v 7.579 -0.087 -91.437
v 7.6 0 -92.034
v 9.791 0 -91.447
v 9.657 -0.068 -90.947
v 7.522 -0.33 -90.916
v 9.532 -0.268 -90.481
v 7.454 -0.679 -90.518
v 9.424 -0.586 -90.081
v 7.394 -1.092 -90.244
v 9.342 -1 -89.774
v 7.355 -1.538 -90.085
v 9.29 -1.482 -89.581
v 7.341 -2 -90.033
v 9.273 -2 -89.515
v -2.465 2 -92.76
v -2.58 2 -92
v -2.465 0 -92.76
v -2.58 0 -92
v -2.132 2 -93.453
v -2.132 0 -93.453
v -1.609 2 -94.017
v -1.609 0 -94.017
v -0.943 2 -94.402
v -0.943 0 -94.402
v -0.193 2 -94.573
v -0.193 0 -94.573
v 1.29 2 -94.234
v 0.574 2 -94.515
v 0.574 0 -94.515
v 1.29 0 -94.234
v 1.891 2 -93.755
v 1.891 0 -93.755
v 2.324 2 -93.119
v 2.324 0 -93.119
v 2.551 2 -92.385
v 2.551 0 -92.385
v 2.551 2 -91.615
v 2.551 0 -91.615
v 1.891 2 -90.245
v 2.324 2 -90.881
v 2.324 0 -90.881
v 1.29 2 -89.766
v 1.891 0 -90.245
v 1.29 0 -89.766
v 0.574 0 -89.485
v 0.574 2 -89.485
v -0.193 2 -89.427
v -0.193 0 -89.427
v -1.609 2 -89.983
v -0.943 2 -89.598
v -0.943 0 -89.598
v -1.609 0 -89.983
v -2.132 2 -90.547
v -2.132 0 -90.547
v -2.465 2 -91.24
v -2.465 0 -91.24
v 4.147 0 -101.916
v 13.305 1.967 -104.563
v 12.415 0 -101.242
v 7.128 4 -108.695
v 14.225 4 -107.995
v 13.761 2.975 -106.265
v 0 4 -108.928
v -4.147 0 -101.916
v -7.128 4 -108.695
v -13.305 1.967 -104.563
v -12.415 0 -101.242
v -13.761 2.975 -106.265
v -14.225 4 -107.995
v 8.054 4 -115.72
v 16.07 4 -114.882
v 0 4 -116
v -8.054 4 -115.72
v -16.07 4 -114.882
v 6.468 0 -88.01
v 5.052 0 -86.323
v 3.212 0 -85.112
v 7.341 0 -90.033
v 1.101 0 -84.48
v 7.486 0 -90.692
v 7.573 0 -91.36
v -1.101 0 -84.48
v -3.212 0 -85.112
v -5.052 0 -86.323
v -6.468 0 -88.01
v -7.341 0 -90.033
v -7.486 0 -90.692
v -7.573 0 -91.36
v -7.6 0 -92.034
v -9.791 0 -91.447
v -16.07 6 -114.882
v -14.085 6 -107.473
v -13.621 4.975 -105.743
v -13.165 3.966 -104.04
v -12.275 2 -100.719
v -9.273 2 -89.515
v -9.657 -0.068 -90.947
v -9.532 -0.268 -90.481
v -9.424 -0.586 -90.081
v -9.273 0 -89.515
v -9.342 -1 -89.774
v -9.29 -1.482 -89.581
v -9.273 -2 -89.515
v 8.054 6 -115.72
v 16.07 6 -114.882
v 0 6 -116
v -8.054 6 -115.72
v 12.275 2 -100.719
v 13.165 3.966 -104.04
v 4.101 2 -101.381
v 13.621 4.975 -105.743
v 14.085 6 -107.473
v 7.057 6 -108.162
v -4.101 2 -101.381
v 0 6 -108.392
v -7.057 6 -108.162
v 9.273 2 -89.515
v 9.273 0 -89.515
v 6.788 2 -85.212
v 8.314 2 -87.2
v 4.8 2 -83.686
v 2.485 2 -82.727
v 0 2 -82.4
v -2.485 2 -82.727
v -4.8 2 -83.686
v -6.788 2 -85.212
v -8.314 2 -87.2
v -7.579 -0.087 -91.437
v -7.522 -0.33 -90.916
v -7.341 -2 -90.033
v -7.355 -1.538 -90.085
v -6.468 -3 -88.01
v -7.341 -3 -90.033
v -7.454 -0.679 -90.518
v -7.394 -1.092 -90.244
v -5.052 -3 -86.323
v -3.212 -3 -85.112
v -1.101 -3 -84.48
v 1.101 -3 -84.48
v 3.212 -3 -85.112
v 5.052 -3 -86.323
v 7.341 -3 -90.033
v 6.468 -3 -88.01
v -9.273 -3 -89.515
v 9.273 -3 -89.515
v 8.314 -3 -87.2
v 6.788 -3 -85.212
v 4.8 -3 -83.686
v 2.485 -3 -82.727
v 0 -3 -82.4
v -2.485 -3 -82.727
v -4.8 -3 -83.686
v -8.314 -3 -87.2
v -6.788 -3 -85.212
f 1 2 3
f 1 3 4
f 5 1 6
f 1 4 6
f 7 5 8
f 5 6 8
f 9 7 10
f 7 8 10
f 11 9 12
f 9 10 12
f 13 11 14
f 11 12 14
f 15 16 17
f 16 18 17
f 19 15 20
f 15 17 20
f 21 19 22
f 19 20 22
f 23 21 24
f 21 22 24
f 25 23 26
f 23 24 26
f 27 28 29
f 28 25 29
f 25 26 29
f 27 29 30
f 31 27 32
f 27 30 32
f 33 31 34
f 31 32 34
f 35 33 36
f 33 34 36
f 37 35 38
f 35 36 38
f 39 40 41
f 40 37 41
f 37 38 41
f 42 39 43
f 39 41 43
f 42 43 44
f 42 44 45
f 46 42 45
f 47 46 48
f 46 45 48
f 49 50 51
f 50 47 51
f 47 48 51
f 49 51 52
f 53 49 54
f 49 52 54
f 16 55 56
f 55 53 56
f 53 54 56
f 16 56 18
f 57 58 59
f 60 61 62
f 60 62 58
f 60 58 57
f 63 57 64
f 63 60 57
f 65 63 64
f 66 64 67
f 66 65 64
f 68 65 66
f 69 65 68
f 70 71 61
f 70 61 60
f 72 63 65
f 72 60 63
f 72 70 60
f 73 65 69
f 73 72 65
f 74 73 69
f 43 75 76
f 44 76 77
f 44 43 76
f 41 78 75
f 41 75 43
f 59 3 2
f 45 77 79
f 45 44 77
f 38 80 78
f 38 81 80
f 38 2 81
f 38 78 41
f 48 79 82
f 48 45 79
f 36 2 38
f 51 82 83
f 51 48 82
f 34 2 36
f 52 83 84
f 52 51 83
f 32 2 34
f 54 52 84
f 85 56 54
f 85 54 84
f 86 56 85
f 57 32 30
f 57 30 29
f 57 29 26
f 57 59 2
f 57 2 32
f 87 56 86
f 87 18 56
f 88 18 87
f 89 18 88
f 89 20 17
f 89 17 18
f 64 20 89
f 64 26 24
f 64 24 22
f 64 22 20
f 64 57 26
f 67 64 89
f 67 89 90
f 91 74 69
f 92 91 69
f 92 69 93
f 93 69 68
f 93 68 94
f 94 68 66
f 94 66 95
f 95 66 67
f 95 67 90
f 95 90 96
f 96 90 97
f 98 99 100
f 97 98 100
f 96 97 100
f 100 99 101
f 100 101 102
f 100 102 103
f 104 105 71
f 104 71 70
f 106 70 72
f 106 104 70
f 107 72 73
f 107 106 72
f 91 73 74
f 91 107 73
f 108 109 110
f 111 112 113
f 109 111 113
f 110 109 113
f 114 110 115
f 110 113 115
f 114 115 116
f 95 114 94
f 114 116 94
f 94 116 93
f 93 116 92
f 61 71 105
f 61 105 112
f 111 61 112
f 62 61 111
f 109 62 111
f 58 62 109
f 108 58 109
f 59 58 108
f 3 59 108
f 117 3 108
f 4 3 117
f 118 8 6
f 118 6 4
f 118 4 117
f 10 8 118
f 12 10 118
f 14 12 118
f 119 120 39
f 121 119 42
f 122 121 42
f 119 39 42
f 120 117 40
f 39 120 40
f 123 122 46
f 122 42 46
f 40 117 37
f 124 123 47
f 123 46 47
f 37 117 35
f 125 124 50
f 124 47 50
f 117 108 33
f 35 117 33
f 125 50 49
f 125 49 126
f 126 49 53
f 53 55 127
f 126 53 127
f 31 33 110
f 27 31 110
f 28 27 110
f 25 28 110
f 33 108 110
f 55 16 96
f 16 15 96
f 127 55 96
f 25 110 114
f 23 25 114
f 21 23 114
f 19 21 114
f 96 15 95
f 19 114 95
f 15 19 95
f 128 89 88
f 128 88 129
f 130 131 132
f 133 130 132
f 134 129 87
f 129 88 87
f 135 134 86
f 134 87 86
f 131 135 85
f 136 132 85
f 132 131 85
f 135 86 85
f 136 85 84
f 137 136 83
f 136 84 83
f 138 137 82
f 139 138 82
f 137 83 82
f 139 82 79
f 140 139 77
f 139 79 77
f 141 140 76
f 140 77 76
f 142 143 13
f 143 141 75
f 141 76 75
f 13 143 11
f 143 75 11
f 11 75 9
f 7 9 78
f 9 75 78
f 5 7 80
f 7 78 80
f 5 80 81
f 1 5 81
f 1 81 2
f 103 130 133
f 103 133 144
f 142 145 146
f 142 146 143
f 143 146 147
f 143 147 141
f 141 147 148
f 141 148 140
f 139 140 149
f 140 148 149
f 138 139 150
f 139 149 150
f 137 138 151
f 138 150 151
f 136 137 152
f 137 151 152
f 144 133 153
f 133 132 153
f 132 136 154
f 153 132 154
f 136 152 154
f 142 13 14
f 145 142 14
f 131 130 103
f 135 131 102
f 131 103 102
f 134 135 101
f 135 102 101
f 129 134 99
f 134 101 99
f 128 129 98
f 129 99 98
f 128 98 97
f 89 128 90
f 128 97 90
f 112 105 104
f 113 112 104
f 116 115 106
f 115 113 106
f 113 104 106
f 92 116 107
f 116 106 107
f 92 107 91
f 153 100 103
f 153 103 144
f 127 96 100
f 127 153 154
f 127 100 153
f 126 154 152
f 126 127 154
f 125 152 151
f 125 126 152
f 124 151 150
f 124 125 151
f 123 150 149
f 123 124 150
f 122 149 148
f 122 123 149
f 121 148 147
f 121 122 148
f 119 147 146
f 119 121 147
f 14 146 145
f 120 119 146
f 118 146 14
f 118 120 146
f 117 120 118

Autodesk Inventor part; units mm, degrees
ref_plane "YZ Plane" through (0, 0, 0) normal (1, 0, 0) x (0, 1, 0)
ref_plane "XZ Plane" through (0, 0, 0) normal (0, 1, 0) x (-1, 0, 0)
ref_plane "XY Plane" through (0, 0, 0) normal (0, 0, 1) x (1, 0, 0)
sketch "草圖5" plane through (0, 0, 0) normal (0, 0, 1) x (1, 0, 0)
  line L0 (0, 14.1091) -> (0, -11.8545)
  line L1 (-92, 0) -> (-102, 0)
  line L2 (-102, 0) -> (-108.9282, 4)
  line L3 (-108.9282, 4) -> (-116, 4)
  line L4 (-116, 4) -> (-116, 6)
  line L5 (-116, 6) -> (-108.3923, 6)
  line L6 (-108.3923, 6) -> (-101.4641, 2)
  line L7 (-101.4641, 2) -> (-92, 2)
  line L8 (-92, 4.8545) -> (-92, -2.1478) construction
  line L9 (-92, 0) -> (-82, 0)
  line L10 (-82, 0) -> (-82, 2)
  line L11 (-82, 2) -> (-92, 2)
  point P0 (0, 0)
  point P1 (0, 2)
  dimension "d26" = 2
  dimension "d27" = 232
  dimension "d28" = 92
  dimension "d31" = 2
  dimension "d32" = 2
  dimension "d33" = 4
  dimension "d34" = 30
  dimension "d35" = 20
revolve "迴轉1" add sketch "草圖5" angle 360 about axis through (0, 14.1091, 0) along (0, -1, 0)
sketch "草圖6" plane through (0, 0, 0) normal (0, 1, 0) x (-1, 0, 0)
  circle A0 centre (0, -92) radius 2.58
  line L0 (0, -136.9187) -> (0, 28.2306) construction
  line L1 (-16.0697, -114.8815) -> (-9.2729, -89.5153)
  arc A1 (7.341, -90.033) -> (-7.341, -90.033) centre (0, -92) ccw
  line L2 (16.0697, -114.8815) -> (9.2729, -89.5153)
  arc A2 (-16.0697, -114.8815) -> (16.0697, -114.8815) centre (0, 0) ccw
  circle A3 centre (0, 0) radius 116 construction
  arc A4 (9.2729, -89.5153) -> (-9.2729, -89.5153) centre (0, -92) ccw
  arc A5 (-9.7984, -91.4767) -> (9.7984, -91.4767) centre (0, 0) ccw construction
  line L3 (-7.341, -90.033) -> (-9.2729, -89.5153)
  line L4 (7.341, -90.033) -> (9.2729, -89.5153)
  arc A6 (7.2444, -90.0589) -> (-7.2207, -89.9724) centre (0, -92) ccw construction
  point P0 (-9.2729, -89.5153)
  dimension "d38" = 92
  dimension "d46" = 5.16
  dimension "d81" = 7.6
  dimension "d82" = 2
  dimension "d83" = 30
  dimension "d88" = 7.5
extrude "擠出5" cut sketch "草圖6" along normal up to next contours A0
extrude "擠出8" cut sketch "草圖6" along normal blind 10 keep common part
extrude "擠出9" add sketch "草圖6" against normal blind 3 contours A4 L4 A1 L3
fillet "圓角5" radius 2 2 edges at (8.307, 0, -89.7742) (-8.307, 0, -89.7742)
properties part number "transmission_support"
